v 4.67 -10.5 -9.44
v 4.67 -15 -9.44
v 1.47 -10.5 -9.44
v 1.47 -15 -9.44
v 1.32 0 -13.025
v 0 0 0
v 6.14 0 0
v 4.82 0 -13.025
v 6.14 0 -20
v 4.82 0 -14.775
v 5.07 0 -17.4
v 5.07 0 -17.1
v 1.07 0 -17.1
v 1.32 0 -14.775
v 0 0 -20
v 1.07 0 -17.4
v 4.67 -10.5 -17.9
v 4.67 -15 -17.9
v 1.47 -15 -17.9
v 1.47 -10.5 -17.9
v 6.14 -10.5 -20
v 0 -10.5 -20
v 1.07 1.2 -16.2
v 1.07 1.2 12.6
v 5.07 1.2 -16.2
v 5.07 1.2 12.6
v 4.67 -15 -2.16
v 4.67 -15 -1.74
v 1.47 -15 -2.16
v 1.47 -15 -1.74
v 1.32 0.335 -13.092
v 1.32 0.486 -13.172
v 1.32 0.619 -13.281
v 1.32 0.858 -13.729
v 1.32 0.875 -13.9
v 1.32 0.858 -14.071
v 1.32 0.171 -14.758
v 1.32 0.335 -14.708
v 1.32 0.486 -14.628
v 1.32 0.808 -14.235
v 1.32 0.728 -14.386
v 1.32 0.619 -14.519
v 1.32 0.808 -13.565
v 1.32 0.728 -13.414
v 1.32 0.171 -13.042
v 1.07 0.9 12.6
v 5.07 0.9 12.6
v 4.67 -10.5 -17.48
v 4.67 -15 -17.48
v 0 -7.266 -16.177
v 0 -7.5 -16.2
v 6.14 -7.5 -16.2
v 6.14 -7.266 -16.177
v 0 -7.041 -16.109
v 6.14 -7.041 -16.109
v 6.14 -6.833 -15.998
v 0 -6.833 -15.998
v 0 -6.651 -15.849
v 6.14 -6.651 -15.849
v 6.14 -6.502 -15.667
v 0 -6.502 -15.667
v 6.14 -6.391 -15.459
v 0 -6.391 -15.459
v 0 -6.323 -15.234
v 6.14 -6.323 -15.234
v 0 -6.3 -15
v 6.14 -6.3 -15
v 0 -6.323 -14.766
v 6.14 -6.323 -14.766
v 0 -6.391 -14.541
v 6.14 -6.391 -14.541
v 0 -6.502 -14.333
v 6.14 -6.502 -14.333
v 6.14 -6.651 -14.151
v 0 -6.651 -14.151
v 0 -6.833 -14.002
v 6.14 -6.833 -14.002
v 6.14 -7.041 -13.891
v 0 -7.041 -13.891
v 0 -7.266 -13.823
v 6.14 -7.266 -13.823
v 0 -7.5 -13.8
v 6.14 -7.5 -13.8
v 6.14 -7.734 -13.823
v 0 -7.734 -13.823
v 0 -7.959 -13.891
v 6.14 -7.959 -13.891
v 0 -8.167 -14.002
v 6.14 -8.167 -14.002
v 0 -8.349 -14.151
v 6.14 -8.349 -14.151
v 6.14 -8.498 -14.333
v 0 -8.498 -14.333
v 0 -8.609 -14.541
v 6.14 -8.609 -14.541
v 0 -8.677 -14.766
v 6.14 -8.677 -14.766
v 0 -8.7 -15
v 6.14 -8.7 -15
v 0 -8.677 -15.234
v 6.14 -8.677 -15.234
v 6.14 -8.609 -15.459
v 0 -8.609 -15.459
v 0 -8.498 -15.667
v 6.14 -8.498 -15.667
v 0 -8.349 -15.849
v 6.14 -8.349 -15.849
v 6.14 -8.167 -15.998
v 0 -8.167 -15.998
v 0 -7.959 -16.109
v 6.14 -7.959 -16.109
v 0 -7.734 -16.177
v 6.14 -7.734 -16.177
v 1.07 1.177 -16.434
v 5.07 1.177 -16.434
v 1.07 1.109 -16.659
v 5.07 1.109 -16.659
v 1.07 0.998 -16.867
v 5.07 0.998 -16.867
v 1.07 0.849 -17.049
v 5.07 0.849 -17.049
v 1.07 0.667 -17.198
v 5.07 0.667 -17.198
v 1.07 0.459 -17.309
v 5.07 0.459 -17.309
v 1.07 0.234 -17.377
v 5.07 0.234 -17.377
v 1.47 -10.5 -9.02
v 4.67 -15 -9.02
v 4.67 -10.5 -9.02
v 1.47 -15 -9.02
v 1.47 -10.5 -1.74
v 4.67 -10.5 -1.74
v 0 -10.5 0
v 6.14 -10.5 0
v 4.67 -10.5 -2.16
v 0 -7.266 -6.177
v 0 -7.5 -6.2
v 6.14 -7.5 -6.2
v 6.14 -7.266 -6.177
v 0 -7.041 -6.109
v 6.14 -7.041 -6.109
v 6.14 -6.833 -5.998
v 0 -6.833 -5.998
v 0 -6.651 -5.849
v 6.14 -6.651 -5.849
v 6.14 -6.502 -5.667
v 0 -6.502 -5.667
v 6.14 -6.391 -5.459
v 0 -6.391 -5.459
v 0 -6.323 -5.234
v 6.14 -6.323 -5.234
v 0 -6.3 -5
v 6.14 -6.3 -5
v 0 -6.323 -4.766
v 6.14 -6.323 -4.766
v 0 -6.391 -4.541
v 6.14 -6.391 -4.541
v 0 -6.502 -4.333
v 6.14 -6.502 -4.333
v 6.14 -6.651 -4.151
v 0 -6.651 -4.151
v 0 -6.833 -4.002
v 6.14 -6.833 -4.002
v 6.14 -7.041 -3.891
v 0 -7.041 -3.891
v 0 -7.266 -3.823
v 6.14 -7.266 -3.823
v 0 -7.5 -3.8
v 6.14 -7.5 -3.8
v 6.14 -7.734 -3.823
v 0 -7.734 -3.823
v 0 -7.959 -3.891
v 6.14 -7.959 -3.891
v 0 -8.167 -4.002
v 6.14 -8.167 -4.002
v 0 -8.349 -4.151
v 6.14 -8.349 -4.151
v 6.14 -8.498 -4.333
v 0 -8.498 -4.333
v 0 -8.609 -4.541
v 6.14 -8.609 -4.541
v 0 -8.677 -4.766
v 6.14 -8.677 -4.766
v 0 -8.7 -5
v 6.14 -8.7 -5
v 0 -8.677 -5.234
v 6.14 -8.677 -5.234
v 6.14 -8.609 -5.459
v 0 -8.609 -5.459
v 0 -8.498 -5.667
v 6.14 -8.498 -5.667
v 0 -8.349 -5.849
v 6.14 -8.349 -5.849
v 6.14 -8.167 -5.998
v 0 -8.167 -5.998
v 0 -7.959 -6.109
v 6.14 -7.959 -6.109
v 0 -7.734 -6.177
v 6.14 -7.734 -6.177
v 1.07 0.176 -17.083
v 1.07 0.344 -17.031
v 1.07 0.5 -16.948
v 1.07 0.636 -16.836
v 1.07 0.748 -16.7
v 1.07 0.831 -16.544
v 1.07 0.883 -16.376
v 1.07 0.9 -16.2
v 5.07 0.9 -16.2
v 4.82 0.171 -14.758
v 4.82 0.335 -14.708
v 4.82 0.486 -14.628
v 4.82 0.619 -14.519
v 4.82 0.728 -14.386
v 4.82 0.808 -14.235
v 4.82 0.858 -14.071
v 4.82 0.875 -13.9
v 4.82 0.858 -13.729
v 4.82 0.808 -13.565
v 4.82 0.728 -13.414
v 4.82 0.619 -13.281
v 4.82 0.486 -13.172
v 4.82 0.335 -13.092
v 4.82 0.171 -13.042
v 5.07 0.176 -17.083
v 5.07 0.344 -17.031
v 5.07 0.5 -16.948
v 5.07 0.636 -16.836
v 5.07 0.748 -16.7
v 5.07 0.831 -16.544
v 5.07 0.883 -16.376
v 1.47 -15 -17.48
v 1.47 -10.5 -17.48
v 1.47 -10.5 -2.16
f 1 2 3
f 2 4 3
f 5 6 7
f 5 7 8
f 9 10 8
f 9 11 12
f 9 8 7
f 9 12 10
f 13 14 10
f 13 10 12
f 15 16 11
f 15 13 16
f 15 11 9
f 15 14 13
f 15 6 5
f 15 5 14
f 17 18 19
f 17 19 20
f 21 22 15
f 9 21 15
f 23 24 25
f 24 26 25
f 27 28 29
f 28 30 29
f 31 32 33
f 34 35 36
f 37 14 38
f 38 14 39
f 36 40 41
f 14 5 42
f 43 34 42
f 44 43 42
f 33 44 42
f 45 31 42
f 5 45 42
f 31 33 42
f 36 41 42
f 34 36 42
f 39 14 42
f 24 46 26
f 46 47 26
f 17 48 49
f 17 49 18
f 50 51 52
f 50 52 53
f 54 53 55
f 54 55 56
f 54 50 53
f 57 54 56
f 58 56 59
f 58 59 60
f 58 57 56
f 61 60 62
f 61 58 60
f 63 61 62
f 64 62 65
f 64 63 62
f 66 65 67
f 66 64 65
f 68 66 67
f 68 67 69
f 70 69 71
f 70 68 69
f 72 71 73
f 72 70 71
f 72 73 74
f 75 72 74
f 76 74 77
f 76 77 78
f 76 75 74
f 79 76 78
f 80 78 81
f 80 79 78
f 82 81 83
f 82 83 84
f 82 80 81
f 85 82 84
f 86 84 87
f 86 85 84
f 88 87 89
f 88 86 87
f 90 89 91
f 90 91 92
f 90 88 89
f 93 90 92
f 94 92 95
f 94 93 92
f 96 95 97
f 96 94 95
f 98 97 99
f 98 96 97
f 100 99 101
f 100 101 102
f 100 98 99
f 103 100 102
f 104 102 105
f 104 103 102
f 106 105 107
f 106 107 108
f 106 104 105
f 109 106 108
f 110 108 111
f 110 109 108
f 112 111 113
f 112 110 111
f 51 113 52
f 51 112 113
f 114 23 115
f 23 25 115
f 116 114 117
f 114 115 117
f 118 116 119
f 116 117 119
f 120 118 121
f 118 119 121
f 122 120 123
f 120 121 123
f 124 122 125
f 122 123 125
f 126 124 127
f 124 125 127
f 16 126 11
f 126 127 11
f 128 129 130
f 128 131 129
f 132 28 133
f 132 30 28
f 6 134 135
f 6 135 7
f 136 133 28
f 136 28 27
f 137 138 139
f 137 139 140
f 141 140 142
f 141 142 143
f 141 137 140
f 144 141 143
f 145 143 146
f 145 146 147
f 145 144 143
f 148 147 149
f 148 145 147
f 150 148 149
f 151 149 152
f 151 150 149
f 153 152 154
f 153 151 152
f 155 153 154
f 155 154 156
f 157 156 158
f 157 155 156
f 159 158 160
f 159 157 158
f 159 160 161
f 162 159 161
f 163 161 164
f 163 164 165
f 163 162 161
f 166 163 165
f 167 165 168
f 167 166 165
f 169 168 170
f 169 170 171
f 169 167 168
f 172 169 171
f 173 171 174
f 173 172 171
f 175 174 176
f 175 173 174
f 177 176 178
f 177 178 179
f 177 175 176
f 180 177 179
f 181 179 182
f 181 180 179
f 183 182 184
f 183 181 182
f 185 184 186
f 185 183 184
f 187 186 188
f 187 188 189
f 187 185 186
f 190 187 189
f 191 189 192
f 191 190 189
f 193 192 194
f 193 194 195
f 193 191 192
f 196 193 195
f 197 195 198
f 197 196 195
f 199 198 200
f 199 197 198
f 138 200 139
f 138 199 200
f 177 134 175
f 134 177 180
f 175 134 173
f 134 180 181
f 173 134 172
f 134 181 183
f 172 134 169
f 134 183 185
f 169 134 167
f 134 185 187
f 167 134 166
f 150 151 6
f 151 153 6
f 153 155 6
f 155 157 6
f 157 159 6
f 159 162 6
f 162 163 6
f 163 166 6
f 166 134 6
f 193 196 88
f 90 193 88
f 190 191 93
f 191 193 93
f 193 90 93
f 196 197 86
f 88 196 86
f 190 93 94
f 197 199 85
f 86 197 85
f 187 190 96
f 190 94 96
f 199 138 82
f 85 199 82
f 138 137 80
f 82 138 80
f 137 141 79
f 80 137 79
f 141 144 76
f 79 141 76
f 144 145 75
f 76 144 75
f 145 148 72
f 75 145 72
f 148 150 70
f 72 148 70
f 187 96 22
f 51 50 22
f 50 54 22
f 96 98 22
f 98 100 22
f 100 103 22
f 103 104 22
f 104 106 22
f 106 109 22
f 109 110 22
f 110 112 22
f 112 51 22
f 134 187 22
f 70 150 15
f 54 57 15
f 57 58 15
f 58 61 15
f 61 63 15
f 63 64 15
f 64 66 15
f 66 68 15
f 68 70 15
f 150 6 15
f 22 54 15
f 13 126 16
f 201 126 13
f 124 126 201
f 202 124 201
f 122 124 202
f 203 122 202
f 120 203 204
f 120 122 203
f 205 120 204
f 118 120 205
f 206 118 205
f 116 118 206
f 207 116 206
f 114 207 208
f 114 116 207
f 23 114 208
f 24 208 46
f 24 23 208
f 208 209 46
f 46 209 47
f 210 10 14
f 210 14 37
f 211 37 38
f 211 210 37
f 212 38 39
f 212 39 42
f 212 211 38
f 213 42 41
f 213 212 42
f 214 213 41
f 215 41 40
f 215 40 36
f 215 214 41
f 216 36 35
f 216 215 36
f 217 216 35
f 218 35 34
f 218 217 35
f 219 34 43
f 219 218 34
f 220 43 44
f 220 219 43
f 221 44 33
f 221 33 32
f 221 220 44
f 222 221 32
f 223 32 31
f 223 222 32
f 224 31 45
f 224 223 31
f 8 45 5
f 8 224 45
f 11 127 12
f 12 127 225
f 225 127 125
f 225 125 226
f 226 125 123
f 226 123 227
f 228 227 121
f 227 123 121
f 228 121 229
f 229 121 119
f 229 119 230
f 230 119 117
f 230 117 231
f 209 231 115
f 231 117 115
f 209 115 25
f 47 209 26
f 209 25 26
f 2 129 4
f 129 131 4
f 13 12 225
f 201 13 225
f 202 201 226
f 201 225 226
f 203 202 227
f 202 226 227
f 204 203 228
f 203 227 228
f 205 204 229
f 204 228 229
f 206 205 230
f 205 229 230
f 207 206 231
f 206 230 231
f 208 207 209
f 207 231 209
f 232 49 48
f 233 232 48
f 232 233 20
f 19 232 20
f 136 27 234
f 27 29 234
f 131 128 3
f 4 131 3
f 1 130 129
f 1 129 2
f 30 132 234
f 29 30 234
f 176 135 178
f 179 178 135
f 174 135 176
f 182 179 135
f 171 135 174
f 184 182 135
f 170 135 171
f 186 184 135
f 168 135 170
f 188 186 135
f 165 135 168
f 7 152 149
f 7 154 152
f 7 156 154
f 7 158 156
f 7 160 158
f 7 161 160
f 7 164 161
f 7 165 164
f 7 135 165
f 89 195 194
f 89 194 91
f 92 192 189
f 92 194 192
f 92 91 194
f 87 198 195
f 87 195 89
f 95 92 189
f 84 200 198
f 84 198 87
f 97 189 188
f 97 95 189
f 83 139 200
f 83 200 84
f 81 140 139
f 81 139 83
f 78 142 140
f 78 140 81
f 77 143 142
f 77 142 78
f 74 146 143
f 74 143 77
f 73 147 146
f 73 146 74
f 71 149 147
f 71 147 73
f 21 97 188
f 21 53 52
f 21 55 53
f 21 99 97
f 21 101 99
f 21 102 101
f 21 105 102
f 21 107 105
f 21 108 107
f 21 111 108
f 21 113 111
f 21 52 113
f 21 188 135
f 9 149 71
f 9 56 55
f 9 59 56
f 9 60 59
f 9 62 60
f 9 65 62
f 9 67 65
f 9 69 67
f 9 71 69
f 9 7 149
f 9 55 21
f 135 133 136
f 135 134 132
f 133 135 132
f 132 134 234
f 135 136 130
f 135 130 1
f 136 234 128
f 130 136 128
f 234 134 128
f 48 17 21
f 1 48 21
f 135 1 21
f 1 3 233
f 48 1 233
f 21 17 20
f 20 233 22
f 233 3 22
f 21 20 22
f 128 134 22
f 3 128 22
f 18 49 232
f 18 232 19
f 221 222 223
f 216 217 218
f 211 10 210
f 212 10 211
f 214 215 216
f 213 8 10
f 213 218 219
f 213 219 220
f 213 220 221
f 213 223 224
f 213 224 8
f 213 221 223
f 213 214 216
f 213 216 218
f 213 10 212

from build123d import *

# Parameters (mm, degrees)
SKETCH1_W           = 20
SKETCH1_H           = 10.5
SKETCH1_R           = 1.2
BOSS_EXTRUDE1_DEPTH = 6.14
BOSS_EXTRUDE2_DEPTH = 2
BOSS_EXTRUDE5_DEPTH = 1.75
SKETCH4_W           = 0.42
SKETCH4_H           = 4.5
BOSS_EXTRUDE6_DEPTH = 1.6


with BuildPart() as part:
    # Sketch1 → Boss-Extrude1 (new body)
    with BuildSketch(Plane(origin=(0, 0, 0), x_dir=(0, 0, -1), z_dir=(1, 0, 0))):
        with Locations((10, -5.25)):
            Rectangle(SKETCH1_W, SKETCH1_H)
        with Locations((5, -7.5)):
            Circle(SKETCH1_R, mode=Mode.SUBTRACT)
        with Locations((15, -7.5)):
            Circle(SKETCH1_R, mode=Mode.SUBTRACT)
    extrude(amount=BOSS_EXTRUDE1_DEPTH)

    # Sketch2 → Boss-Extrude2 (add, symmetric)
    with BuildSketch(Plane(origin=(3.07, 0, 0), x_dir=(0, 0, -1), z_dir=(1, 0, 0))):
        with BuildLine():
            Line((16.2, 0.9), (-12.6, 0.9))
            Line((-12.6, 0.9), (-12.6, 1.2))
            Line((-12.6, 1.2), (16.2, 1.2))
            ThreePointArc((16.2, 1.2), (17.048528137, 0.848528137), (17.4, 0))
            Line((17.4, 0), (17.1, 0))
            ThreePointArc((17.1, 0), (16.836396103, 0.636396103), (16.2, 0.9))
        make_face()
    extrude(amount=BOSS_EXTRUDE2_DEPTH, both=True)

    # Sketch3 → Boss-Extrude5 (add, symmetric)
    with BuildSketch(Plane(origin=(3.07, 0, 0), x_dir=(0, 0, -1), z_dir=(1, 0, 0))):
        with BuildLine():
            Line((13.025, 0), (14.775, 0))
            ThreePointArc((14.775, 0), (13.9, 0.875), (13.025, 0))
        make_face()
    extrude(amount=BOSS_EXTRUDE5_DEPTH, both=True)

    # Sketch4 → Boss-Extrude6 (add, symmetric)
    with BuildSketch(Plane(origin=(3.07, 0, 0), x_dir=(0, 0, -1), z_dir=(1, 0, 0))):
        with Locations((1.95, -12.75)):
            Rectangle(SKETCH4_W, SKETCH4_H)
        with Locations((9.23, -12.75)):
            Rectangle(SKETCH4_W, SKETCH4_H)
        with Locations((17.69, -12.75)):
            Rectangle(SKETCH4_W, SKETCH4_H)
    extrude(amount=BOSS_EXTRUDE6_DEPTH, both=True)


solid = part.part
